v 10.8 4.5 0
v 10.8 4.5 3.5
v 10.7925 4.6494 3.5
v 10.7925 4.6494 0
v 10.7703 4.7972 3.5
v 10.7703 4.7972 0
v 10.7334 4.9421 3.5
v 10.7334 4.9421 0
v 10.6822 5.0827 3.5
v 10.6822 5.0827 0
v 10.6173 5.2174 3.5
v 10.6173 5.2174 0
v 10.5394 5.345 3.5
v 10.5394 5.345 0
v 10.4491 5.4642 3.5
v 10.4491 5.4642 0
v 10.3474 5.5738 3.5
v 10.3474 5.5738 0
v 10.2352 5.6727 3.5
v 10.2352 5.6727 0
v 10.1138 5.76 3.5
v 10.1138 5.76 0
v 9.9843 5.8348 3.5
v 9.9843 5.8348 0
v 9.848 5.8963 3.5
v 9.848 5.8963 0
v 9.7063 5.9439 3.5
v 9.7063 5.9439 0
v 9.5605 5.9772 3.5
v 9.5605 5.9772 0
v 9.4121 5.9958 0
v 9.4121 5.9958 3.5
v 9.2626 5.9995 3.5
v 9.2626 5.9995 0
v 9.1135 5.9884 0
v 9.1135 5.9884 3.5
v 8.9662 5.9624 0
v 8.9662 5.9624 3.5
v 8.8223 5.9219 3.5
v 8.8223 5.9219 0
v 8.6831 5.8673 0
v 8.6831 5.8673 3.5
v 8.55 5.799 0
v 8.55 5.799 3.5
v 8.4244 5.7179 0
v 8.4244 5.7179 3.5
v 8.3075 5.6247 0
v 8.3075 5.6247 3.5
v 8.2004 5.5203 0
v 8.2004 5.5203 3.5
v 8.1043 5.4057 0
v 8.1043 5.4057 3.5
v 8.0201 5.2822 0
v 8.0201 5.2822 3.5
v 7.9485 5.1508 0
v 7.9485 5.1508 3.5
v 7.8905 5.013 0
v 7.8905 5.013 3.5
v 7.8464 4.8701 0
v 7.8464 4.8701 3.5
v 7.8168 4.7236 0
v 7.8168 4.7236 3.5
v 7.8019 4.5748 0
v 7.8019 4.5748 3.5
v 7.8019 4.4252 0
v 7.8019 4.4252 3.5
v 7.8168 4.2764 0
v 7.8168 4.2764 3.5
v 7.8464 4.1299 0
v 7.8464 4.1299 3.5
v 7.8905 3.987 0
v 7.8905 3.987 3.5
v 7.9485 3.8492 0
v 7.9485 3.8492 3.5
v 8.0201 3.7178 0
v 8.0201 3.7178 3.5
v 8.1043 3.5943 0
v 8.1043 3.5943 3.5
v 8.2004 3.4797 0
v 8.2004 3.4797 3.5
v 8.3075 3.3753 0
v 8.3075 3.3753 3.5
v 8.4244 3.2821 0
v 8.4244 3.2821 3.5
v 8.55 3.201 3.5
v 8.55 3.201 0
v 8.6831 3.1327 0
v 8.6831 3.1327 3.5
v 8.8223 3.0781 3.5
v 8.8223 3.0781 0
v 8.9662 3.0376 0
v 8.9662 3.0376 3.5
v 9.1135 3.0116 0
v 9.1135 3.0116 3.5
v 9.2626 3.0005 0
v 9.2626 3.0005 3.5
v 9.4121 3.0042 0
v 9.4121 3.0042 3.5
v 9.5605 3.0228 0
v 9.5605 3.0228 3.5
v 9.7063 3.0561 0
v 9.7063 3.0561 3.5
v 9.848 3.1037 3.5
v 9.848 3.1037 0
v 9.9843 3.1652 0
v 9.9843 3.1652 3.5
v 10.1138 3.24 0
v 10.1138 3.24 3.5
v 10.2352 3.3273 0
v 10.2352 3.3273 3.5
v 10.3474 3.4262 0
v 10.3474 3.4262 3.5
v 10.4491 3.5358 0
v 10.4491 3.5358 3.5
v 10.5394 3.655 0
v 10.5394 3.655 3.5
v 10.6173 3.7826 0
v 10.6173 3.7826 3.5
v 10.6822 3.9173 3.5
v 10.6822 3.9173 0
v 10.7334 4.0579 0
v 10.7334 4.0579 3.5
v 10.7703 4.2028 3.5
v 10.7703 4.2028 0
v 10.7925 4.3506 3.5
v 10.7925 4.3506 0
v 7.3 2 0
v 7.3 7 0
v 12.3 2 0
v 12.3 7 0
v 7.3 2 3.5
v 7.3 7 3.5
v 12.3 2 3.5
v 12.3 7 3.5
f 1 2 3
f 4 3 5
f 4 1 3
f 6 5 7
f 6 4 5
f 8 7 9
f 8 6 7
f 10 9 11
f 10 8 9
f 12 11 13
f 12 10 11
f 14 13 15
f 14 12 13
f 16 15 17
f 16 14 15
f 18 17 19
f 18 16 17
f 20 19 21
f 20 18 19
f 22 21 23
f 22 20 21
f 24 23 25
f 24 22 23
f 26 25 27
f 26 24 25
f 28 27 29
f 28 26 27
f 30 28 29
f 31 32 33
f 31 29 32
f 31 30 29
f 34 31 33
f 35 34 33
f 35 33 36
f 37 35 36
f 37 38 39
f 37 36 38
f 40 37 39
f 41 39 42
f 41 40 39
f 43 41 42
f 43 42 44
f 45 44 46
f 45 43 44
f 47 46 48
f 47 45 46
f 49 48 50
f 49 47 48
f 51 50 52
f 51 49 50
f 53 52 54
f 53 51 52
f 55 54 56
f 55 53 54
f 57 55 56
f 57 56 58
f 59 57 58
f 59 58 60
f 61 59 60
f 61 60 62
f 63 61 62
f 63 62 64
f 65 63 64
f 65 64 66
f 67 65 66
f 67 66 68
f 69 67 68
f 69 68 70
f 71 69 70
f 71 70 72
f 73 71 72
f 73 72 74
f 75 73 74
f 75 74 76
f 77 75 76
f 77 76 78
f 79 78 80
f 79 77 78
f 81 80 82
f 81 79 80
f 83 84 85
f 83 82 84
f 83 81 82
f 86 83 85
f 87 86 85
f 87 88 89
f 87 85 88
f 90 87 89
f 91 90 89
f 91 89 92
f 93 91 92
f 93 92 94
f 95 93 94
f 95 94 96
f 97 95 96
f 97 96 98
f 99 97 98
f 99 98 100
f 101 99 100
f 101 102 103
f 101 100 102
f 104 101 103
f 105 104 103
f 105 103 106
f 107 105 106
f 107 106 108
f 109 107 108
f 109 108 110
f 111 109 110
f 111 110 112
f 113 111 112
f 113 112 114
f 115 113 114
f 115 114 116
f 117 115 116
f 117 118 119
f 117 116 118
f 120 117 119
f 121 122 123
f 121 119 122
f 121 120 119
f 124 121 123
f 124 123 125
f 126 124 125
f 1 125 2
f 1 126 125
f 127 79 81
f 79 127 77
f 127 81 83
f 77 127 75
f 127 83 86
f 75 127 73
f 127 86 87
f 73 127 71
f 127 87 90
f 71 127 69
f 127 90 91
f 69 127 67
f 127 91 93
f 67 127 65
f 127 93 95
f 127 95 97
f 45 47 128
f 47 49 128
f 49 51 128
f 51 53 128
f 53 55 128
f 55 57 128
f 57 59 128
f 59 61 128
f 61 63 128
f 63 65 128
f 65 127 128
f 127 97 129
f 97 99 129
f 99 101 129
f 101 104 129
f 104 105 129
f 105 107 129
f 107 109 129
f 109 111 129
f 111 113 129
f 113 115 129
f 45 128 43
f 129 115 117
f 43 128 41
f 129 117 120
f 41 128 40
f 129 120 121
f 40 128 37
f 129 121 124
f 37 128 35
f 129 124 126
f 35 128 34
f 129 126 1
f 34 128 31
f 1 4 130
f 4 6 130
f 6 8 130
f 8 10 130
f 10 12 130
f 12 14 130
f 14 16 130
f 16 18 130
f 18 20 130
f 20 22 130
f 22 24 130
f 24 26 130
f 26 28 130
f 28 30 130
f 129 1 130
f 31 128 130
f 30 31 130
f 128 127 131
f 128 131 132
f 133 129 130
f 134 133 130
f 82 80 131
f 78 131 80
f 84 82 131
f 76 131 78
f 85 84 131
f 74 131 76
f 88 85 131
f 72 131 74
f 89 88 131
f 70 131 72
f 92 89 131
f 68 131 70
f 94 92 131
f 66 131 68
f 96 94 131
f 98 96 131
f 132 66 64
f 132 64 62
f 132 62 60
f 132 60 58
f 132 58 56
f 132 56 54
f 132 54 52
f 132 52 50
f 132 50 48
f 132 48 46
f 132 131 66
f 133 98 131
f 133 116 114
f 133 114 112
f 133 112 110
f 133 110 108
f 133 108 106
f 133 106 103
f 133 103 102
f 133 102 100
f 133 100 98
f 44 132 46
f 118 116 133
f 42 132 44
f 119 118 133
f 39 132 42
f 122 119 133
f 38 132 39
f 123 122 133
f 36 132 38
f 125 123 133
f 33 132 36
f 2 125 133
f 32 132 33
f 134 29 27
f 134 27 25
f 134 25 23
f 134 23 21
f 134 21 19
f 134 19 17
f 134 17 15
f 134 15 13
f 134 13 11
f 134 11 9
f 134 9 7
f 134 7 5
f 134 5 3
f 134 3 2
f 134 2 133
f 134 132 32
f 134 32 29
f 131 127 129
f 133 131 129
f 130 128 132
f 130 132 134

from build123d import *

# Parameters (mm, degrees)
CYLINDER_R     = 1.5
CYLINDER_DEPTH = 10
BOX008_W       = 5
BOX008_H       = 5
BOX008_DEPTH   = 3.5


with BuildPart() as hole:
    # Cylinder → Cylinder (new body)
    with BuildSketch(Plane(origin=(9.3, 4.5, 0), x_dir=(1, 0, 0), z_dir=(0, 0, 1))):
        Circle(CYLINDER_R)
    extrude(amount=CYLINDER_DEPTH)


with BuildPart() as stand_hole_cut:
    # Box008 → Box008 (new body)
    with BuildSketch(Plane(origin=(7.3, 2, 0), x_dir=(1, 0, 0), z_dir=(0, 0, 1))):
        with Locations((2.5, 2.5)):
            Rectangle(BOX008_W, BOX008_H)
    extrude(amount=BOX008_DEPTH)

    # Cut003002: cut hole
    add(hole.part, mode=Mode.SUBTRACT)


solid = stand_hole_cut.part
